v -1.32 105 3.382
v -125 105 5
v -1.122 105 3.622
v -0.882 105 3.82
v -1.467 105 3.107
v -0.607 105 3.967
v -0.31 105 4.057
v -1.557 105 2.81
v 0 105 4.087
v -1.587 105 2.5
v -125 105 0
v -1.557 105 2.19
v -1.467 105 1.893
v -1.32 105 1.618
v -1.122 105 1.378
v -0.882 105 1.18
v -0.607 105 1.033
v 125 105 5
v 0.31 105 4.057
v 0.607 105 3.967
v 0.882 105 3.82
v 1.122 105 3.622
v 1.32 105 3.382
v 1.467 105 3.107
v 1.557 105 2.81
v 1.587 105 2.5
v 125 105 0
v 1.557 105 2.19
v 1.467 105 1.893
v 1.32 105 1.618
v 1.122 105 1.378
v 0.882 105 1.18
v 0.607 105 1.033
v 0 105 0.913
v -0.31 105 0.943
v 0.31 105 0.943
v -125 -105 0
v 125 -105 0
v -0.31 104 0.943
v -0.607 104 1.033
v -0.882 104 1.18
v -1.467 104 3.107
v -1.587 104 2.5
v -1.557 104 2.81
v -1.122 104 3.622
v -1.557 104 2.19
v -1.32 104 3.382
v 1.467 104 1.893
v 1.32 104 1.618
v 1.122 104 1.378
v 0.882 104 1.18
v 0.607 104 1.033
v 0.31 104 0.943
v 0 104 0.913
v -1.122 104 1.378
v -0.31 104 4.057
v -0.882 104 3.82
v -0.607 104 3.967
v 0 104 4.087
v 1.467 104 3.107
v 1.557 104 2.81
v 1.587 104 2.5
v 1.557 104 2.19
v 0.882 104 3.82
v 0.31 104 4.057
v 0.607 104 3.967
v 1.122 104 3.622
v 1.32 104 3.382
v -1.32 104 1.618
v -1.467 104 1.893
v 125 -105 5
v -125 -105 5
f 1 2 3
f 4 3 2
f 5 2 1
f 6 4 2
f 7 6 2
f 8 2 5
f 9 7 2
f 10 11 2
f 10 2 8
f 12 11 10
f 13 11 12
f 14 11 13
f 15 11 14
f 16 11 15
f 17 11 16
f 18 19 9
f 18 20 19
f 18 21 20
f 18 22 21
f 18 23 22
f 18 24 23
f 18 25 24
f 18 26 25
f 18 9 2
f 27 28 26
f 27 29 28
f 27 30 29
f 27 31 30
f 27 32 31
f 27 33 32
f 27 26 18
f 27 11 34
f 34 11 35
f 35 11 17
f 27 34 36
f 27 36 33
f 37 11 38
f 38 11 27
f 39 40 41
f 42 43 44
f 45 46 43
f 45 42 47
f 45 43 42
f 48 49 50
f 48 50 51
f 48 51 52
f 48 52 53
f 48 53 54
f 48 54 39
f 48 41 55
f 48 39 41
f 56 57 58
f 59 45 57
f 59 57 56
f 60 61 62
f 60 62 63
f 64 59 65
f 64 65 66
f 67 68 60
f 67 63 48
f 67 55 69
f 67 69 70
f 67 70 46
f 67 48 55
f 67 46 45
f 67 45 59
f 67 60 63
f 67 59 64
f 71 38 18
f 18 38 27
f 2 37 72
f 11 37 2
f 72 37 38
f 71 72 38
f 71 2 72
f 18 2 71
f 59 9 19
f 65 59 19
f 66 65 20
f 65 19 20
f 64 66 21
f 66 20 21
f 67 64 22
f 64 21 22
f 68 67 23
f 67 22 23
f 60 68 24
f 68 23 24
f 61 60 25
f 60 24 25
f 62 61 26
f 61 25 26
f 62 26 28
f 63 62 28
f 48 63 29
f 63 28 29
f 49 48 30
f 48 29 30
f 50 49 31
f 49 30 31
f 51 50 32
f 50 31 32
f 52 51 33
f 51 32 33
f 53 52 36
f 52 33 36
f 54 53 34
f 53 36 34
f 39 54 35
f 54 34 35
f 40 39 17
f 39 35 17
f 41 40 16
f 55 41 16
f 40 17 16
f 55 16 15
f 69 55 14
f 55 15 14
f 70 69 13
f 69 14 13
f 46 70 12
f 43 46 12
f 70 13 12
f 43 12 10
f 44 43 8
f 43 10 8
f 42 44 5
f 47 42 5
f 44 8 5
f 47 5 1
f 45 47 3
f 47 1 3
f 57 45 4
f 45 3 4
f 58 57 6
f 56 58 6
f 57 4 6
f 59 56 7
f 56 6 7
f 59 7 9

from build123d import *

# Parameters (mm, degrees)
ESQUISSE1_W             = 250
ESQUISSE1_H             = 210
BOSS_EXTRU_1_DEPTH      = 5
ESQUISSE2_R             = 1.587392493
ENL_V_MAT_EXTRU_2_DEPTH = 1


with BuildPart() as part:
    # Esquisse1 → Boss.-Extru.1 (new body)
    with BuildSketch(Plane.XY):
        Rectangle(ESQUISSE1_W, ESQUISSE1_H)
    extrude(amount=BOSS_EXTRU_1_DEPTH)

    # Esquisse2 → Enlèv. mat.-Extru.2 (cut)
    with BuildSketch(Plane(origin=(0, 105, 0), x_dir=(1, 0, 0), z_dir=(0, 1, 0))):
        with Locations(Location((0, -2.5, 0), (0, 0, 270))):
            Circle(ESQUISSE2_R)
    extrude(amount=-ENL_V_MAT_EXTRU_2_DEPTH, mode=Mode.SUBTRACT)


solid = part.part
